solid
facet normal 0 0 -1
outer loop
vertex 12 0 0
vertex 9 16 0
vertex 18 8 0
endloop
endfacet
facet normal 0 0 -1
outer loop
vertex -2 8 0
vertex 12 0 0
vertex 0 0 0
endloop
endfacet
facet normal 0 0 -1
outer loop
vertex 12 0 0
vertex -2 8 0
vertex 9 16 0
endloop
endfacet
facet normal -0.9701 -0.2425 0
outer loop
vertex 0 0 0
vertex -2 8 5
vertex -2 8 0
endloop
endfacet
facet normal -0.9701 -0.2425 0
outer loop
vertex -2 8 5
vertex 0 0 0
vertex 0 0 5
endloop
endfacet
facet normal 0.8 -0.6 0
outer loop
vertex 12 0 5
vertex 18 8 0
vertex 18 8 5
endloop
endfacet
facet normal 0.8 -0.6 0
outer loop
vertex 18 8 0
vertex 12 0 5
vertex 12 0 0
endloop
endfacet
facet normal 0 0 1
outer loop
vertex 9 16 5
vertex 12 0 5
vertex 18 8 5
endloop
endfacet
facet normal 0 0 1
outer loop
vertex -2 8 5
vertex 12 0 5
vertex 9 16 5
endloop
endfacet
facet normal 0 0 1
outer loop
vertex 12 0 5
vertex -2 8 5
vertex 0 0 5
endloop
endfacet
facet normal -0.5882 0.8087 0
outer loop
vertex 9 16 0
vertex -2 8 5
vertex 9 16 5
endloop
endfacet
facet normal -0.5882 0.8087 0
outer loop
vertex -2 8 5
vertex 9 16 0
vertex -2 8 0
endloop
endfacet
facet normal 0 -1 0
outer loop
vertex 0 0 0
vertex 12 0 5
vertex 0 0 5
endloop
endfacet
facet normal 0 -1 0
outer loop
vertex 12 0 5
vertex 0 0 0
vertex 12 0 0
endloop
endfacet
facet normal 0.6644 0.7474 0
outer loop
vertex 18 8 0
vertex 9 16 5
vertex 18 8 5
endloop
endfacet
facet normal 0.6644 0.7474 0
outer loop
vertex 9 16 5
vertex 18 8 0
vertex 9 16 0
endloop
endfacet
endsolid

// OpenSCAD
$fn = 50;

difference() {
	union() {
		linear_extrude(height = 5) {
			polygon(points = [[0, 0], [12, 0], [18, 8], [9, 16], [-2, 8]]);
		}
	}
	union();
}
